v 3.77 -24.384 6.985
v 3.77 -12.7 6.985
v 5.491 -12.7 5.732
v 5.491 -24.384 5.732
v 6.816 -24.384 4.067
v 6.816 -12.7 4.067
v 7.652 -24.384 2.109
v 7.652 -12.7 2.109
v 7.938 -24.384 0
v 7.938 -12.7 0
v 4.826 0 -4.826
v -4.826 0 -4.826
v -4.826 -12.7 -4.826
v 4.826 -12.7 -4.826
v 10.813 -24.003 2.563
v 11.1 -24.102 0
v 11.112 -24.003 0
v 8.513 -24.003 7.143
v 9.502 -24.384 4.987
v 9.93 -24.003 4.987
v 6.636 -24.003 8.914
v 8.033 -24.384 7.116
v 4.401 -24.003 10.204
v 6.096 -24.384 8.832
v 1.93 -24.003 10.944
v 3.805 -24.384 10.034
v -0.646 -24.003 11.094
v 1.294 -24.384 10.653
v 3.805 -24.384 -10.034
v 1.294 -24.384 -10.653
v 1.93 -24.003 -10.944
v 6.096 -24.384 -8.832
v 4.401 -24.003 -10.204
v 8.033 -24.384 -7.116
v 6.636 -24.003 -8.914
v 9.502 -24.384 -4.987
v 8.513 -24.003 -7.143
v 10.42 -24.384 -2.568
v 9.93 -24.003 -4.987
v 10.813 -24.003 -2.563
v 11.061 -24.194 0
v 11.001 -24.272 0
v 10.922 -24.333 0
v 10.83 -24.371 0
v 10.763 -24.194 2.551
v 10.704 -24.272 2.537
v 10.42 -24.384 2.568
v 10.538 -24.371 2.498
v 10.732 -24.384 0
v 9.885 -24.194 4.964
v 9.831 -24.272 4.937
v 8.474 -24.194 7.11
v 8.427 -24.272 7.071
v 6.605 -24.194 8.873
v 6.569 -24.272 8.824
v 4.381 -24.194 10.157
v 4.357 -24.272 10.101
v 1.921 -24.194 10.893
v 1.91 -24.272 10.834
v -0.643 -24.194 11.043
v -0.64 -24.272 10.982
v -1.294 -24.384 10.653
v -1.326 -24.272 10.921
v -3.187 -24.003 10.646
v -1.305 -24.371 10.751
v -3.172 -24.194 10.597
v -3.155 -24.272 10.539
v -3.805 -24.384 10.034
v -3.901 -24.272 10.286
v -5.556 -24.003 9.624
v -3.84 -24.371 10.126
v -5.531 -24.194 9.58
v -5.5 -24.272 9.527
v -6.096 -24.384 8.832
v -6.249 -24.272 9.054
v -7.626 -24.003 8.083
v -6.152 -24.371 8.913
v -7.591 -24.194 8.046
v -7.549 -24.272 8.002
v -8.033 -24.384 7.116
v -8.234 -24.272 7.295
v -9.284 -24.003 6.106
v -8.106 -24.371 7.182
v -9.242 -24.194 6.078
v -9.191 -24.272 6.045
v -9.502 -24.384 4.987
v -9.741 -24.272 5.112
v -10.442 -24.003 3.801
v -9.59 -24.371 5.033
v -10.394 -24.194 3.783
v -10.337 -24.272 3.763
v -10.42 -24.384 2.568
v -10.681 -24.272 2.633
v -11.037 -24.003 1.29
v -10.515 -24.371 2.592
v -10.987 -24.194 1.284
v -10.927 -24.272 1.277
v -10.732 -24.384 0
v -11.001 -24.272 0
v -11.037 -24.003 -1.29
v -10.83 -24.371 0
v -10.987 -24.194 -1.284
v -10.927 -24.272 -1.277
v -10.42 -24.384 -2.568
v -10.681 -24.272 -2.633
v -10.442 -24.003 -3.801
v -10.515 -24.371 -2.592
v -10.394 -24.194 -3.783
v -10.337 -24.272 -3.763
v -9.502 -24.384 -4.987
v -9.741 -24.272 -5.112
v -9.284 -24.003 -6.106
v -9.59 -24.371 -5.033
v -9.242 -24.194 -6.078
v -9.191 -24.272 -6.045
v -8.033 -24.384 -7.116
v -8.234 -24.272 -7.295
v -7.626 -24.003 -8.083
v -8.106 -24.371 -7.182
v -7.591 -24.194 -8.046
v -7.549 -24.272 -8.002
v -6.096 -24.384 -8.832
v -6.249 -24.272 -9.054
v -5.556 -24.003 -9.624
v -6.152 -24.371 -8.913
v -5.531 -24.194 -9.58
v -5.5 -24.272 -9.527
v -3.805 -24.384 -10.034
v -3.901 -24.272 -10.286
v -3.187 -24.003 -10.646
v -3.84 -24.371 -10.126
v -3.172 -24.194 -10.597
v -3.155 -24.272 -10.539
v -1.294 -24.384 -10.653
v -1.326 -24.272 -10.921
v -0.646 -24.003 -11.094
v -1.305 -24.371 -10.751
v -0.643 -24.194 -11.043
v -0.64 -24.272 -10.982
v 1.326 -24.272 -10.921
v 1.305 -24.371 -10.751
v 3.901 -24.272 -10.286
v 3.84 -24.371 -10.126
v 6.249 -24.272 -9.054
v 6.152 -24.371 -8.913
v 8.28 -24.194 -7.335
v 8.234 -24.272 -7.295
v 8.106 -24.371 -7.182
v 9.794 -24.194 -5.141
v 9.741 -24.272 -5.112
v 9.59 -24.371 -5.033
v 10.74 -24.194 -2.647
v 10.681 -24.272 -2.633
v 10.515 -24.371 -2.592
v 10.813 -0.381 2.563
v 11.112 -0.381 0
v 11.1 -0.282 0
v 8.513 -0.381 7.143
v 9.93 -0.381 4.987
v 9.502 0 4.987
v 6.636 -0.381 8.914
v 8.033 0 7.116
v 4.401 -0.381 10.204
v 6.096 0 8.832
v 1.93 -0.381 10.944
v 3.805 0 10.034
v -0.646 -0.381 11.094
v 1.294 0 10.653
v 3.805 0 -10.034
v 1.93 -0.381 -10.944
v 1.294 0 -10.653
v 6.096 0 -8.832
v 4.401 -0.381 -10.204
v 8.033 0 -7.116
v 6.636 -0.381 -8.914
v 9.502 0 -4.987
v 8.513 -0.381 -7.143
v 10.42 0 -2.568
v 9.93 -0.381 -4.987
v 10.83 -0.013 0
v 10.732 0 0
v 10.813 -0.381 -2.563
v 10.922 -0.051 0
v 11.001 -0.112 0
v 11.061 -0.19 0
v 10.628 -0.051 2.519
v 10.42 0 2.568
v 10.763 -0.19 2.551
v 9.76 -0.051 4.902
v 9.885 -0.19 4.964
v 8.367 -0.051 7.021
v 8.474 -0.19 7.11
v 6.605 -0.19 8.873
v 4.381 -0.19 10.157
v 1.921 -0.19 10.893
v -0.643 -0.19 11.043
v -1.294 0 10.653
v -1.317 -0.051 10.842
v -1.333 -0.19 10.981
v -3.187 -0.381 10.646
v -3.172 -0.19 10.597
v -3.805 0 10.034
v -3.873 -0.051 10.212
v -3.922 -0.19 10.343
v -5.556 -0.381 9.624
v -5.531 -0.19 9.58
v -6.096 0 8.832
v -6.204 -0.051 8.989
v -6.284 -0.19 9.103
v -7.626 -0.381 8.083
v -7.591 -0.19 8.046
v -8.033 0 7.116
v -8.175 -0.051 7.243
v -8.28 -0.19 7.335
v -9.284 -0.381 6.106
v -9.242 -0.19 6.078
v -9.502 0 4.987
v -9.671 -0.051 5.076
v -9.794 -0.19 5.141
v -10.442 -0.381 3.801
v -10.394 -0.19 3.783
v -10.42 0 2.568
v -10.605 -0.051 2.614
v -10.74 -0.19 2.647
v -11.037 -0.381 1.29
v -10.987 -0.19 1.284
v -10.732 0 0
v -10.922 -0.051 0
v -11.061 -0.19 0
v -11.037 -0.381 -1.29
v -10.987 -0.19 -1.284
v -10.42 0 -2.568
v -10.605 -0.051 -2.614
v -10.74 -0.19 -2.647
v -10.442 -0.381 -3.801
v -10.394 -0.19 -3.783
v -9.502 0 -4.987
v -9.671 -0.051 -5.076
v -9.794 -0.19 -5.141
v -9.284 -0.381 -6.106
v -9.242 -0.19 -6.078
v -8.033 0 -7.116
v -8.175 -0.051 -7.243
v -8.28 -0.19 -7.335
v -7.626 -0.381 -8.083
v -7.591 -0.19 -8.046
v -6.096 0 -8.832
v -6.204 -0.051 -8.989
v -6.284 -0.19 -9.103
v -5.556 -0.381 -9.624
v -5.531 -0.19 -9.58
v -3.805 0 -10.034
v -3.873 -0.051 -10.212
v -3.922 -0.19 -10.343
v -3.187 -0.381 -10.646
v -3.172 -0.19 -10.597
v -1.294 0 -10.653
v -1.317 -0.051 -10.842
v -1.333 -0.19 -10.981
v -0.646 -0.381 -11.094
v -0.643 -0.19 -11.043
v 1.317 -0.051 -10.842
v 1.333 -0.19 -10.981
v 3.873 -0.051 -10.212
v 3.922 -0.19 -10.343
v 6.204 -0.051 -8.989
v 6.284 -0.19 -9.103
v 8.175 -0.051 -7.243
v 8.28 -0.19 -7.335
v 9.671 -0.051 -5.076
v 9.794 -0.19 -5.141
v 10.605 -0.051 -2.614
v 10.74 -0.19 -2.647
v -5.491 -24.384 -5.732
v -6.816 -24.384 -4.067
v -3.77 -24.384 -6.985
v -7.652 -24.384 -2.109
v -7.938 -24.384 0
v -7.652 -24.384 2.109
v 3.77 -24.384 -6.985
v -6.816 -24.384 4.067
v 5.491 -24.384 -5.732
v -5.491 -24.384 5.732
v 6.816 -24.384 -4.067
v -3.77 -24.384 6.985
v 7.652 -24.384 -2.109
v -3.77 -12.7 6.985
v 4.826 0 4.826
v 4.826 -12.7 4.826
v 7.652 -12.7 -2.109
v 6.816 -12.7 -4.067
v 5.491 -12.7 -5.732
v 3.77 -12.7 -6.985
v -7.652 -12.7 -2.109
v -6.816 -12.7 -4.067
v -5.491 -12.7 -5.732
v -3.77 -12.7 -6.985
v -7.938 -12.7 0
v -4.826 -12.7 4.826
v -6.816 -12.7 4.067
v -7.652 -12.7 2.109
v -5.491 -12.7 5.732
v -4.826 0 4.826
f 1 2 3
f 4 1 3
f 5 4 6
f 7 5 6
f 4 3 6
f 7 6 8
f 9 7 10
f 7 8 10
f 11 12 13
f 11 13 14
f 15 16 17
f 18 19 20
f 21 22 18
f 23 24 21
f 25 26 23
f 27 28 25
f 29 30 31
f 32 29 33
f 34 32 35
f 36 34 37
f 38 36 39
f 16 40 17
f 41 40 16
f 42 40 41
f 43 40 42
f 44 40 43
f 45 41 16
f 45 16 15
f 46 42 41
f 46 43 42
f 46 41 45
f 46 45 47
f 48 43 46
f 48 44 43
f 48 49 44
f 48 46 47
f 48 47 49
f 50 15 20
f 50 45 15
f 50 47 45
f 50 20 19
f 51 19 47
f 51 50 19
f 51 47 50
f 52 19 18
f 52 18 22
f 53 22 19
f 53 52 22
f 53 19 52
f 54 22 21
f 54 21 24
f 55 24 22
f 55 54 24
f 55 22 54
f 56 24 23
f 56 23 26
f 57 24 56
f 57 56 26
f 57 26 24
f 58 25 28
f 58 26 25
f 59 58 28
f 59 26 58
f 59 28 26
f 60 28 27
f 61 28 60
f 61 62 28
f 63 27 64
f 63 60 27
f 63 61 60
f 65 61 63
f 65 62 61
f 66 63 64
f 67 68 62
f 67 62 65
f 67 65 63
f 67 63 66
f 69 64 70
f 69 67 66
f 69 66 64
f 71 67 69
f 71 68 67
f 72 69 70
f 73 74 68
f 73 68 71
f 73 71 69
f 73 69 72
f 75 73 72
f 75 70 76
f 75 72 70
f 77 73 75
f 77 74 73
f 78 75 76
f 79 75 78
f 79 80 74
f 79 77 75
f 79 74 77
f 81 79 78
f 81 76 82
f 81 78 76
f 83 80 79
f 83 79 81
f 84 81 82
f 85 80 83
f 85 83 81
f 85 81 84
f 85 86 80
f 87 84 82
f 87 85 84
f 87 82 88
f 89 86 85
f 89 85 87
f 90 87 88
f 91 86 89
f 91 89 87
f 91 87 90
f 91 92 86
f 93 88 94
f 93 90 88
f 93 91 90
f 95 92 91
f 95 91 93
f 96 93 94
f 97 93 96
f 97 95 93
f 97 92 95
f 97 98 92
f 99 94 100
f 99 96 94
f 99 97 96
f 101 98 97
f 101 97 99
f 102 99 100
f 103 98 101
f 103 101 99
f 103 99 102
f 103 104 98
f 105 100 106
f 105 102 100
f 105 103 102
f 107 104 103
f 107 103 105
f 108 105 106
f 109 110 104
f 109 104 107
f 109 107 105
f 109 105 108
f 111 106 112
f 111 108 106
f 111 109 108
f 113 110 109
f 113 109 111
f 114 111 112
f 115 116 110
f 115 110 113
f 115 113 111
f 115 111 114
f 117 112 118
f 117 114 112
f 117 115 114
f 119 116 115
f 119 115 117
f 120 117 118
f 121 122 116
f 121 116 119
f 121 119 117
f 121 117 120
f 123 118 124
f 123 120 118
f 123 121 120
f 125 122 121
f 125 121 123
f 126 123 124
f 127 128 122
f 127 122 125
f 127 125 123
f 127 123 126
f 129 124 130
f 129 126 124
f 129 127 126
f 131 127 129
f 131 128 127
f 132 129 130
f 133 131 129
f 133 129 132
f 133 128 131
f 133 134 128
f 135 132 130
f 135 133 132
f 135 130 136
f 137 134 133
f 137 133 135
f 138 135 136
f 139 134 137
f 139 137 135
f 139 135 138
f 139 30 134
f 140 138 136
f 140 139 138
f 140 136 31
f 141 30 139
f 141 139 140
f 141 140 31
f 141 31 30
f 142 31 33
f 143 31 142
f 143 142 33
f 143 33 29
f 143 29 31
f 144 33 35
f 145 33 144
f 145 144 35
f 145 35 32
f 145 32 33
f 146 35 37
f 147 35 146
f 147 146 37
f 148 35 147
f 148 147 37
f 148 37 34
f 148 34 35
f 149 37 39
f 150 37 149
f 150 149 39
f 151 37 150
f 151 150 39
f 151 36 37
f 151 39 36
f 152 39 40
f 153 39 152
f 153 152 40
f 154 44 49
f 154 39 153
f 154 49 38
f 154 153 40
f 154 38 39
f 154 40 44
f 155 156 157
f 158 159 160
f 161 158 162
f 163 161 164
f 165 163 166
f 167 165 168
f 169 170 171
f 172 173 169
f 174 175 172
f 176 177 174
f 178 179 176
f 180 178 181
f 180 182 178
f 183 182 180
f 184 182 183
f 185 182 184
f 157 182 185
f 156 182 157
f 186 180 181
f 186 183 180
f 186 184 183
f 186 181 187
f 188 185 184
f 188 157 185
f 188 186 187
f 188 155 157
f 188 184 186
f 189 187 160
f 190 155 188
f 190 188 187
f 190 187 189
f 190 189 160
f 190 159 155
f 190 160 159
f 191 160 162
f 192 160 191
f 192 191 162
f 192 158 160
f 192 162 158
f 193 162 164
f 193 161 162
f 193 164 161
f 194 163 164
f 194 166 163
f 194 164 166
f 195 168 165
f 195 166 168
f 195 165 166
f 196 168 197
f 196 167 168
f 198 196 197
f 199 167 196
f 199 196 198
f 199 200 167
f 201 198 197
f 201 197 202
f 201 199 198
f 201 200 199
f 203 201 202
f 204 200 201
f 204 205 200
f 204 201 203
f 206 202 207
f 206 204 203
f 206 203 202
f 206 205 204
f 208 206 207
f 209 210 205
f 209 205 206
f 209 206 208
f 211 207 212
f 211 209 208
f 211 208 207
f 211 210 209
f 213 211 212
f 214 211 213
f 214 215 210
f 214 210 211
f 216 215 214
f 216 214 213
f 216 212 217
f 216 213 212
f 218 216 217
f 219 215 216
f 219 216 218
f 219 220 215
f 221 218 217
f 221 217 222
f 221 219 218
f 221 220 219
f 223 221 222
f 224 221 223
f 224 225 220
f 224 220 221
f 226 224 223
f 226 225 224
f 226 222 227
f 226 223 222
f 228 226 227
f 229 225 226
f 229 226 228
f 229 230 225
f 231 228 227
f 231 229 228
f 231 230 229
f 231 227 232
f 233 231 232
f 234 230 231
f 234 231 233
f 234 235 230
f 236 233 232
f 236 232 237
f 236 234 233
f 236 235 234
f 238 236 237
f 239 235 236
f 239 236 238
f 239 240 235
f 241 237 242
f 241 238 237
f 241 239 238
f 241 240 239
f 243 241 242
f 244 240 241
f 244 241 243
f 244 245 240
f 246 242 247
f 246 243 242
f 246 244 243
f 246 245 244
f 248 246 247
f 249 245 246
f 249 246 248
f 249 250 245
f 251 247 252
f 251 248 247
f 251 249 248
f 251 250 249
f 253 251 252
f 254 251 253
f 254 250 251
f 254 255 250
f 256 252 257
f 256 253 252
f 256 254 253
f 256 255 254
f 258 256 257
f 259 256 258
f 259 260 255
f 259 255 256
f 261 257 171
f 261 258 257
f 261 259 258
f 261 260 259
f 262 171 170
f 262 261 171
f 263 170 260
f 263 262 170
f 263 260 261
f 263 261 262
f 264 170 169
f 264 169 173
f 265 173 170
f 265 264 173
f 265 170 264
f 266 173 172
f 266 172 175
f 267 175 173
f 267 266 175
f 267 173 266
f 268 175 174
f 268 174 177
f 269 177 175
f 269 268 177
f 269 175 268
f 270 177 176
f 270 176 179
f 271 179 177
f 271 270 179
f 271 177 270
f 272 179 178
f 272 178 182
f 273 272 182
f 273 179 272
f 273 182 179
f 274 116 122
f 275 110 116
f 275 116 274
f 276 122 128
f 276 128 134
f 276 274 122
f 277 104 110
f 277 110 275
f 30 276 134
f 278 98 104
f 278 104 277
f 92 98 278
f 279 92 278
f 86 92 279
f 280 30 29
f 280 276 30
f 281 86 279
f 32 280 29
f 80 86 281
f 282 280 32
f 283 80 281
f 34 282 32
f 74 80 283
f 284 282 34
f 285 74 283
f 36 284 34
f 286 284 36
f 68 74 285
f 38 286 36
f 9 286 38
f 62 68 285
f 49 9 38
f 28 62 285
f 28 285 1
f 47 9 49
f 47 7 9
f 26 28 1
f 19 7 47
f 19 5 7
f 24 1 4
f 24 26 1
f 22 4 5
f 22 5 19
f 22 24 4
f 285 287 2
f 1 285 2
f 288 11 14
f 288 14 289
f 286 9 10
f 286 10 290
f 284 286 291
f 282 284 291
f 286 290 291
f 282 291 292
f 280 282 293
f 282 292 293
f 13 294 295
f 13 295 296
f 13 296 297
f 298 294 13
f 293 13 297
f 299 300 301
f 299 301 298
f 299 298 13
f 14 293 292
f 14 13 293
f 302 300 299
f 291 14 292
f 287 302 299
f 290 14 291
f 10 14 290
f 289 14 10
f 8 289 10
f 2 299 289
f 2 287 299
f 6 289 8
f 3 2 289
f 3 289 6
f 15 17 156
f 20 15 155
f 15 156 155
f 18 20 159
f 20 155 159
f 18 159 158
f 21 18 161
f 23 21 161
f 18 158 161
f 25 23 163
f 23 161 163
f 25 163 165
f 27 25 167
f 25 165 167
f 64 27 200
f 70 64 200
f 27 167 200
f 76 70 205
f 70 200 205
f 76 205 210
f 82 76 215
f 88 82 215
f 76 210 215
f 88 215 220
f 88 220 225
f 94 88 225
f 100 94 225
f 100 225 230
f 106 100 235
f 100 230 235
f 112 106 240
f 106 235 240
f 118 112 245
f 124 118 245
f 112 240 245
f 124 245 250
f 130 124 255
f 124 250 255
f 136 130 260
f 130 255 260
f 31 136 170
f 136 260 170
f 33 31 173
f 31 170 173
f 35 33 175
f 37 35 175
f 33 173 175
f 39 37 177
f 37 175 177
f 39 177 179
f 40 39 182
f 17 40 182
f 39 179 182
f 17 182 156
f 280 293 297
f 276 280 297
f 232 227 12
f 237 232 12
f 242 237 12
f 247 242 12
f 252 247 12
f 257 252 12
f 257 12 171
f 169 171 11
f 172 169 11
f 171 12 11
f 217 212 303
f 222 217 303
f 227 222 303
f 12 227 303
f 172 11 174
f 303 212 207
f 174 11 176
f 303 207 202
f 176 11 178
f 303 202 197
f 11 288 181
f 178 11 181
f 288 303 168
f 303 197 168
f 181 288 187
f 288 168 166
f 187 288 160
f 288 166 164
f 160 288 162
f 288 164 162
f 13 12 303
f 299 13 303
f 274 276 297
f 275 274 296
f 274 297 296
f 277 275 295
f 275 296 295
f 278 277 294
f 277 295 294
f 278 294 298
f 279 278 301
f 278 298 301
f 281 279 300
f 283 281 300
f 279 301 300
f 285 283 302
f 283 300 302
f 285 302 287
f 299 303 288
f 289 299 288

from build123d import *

# Parameters (mm, degrees)
F0_R     = 11.1125
F1_DEPTH = 24.384
F0_W     = 9.652
F0_H     = 9.652
F2_DEPTH = 12.7
F3_R     = 0.381


with BuildPart() as f1:
    # F0 (on Front) → F1 (new body)
    with BuildSketch(Plane.XZ):
        Circle(F0_R)
        with BuildLine():
            ThreePointArc((3.770104, 6.985), (6.816491, 4.066861), (7.9375, 0))
            ThreePointArc((7.9375, 0), (6.816491, -4.066861), (3.770104, -6.985))
            ThreePointArc((3.770104, -6.985), (0, -7.9375), (-3.770104, -6.985))
            ThreePointArc((-3.770104, -6.985), (-7.9375, 0), (-3.770104, 6.985))
            ThreePointArc((-3.770104, 6.985), (0, 7.9375), (3.770104, 6.985))
        make_face(mode=Mode.SUBTRACT)
        with BuildLine():
            ThreePointArc((-3.770104, -6.985), (0, -7.9375), (3.770104, -6.985))
            Line((3.770104, -6.985), (-3.770104, -6.985))
        make_face()
        with BuildLine():
            Line((-3.770104, 6.985), (3.770104, 6.985))
            ThreePointArc((3.770104, 6.985), (0, 7.9375), (-3.770104, 6.985))
        make_face()
    extrude(amount=F1_DEPTH)

    # F0 (on Front) → F2 (join)
    with BuildSketch(Plane.XZ):
        with BuildLine():
            ThreePointArc((3.770104, -6.985), (6.816491, -4.066861), (7.9375, 0))
            ThreePointArc((7.9375, 0), (6.816491, 4.066861), (3.770104, 6.985))
            Line((3.770104, 6.985), (-3.770104, 6.985))
            ThreePointArc((-3.770104, 6.985), (-7.9375, 0), (-3.770104, -6.985))
            Line((-3.770104, -6.985), (3.770104, -6.985))
        make_face()
        Rectangle(F0_W, F0_H, mode=Mode.SUBTRACT)
    extrude(amount=F2_DEPTH)

    # F3
    f3_edges = [f1.edges().sort_by_distance(p)[0] for p in [
        (-11.1125, -24.384, 0),
        (-11.1125, 0, 0),
    ]]
    fillet(f3_edges, radius=F3_R)


solid = f1.part
